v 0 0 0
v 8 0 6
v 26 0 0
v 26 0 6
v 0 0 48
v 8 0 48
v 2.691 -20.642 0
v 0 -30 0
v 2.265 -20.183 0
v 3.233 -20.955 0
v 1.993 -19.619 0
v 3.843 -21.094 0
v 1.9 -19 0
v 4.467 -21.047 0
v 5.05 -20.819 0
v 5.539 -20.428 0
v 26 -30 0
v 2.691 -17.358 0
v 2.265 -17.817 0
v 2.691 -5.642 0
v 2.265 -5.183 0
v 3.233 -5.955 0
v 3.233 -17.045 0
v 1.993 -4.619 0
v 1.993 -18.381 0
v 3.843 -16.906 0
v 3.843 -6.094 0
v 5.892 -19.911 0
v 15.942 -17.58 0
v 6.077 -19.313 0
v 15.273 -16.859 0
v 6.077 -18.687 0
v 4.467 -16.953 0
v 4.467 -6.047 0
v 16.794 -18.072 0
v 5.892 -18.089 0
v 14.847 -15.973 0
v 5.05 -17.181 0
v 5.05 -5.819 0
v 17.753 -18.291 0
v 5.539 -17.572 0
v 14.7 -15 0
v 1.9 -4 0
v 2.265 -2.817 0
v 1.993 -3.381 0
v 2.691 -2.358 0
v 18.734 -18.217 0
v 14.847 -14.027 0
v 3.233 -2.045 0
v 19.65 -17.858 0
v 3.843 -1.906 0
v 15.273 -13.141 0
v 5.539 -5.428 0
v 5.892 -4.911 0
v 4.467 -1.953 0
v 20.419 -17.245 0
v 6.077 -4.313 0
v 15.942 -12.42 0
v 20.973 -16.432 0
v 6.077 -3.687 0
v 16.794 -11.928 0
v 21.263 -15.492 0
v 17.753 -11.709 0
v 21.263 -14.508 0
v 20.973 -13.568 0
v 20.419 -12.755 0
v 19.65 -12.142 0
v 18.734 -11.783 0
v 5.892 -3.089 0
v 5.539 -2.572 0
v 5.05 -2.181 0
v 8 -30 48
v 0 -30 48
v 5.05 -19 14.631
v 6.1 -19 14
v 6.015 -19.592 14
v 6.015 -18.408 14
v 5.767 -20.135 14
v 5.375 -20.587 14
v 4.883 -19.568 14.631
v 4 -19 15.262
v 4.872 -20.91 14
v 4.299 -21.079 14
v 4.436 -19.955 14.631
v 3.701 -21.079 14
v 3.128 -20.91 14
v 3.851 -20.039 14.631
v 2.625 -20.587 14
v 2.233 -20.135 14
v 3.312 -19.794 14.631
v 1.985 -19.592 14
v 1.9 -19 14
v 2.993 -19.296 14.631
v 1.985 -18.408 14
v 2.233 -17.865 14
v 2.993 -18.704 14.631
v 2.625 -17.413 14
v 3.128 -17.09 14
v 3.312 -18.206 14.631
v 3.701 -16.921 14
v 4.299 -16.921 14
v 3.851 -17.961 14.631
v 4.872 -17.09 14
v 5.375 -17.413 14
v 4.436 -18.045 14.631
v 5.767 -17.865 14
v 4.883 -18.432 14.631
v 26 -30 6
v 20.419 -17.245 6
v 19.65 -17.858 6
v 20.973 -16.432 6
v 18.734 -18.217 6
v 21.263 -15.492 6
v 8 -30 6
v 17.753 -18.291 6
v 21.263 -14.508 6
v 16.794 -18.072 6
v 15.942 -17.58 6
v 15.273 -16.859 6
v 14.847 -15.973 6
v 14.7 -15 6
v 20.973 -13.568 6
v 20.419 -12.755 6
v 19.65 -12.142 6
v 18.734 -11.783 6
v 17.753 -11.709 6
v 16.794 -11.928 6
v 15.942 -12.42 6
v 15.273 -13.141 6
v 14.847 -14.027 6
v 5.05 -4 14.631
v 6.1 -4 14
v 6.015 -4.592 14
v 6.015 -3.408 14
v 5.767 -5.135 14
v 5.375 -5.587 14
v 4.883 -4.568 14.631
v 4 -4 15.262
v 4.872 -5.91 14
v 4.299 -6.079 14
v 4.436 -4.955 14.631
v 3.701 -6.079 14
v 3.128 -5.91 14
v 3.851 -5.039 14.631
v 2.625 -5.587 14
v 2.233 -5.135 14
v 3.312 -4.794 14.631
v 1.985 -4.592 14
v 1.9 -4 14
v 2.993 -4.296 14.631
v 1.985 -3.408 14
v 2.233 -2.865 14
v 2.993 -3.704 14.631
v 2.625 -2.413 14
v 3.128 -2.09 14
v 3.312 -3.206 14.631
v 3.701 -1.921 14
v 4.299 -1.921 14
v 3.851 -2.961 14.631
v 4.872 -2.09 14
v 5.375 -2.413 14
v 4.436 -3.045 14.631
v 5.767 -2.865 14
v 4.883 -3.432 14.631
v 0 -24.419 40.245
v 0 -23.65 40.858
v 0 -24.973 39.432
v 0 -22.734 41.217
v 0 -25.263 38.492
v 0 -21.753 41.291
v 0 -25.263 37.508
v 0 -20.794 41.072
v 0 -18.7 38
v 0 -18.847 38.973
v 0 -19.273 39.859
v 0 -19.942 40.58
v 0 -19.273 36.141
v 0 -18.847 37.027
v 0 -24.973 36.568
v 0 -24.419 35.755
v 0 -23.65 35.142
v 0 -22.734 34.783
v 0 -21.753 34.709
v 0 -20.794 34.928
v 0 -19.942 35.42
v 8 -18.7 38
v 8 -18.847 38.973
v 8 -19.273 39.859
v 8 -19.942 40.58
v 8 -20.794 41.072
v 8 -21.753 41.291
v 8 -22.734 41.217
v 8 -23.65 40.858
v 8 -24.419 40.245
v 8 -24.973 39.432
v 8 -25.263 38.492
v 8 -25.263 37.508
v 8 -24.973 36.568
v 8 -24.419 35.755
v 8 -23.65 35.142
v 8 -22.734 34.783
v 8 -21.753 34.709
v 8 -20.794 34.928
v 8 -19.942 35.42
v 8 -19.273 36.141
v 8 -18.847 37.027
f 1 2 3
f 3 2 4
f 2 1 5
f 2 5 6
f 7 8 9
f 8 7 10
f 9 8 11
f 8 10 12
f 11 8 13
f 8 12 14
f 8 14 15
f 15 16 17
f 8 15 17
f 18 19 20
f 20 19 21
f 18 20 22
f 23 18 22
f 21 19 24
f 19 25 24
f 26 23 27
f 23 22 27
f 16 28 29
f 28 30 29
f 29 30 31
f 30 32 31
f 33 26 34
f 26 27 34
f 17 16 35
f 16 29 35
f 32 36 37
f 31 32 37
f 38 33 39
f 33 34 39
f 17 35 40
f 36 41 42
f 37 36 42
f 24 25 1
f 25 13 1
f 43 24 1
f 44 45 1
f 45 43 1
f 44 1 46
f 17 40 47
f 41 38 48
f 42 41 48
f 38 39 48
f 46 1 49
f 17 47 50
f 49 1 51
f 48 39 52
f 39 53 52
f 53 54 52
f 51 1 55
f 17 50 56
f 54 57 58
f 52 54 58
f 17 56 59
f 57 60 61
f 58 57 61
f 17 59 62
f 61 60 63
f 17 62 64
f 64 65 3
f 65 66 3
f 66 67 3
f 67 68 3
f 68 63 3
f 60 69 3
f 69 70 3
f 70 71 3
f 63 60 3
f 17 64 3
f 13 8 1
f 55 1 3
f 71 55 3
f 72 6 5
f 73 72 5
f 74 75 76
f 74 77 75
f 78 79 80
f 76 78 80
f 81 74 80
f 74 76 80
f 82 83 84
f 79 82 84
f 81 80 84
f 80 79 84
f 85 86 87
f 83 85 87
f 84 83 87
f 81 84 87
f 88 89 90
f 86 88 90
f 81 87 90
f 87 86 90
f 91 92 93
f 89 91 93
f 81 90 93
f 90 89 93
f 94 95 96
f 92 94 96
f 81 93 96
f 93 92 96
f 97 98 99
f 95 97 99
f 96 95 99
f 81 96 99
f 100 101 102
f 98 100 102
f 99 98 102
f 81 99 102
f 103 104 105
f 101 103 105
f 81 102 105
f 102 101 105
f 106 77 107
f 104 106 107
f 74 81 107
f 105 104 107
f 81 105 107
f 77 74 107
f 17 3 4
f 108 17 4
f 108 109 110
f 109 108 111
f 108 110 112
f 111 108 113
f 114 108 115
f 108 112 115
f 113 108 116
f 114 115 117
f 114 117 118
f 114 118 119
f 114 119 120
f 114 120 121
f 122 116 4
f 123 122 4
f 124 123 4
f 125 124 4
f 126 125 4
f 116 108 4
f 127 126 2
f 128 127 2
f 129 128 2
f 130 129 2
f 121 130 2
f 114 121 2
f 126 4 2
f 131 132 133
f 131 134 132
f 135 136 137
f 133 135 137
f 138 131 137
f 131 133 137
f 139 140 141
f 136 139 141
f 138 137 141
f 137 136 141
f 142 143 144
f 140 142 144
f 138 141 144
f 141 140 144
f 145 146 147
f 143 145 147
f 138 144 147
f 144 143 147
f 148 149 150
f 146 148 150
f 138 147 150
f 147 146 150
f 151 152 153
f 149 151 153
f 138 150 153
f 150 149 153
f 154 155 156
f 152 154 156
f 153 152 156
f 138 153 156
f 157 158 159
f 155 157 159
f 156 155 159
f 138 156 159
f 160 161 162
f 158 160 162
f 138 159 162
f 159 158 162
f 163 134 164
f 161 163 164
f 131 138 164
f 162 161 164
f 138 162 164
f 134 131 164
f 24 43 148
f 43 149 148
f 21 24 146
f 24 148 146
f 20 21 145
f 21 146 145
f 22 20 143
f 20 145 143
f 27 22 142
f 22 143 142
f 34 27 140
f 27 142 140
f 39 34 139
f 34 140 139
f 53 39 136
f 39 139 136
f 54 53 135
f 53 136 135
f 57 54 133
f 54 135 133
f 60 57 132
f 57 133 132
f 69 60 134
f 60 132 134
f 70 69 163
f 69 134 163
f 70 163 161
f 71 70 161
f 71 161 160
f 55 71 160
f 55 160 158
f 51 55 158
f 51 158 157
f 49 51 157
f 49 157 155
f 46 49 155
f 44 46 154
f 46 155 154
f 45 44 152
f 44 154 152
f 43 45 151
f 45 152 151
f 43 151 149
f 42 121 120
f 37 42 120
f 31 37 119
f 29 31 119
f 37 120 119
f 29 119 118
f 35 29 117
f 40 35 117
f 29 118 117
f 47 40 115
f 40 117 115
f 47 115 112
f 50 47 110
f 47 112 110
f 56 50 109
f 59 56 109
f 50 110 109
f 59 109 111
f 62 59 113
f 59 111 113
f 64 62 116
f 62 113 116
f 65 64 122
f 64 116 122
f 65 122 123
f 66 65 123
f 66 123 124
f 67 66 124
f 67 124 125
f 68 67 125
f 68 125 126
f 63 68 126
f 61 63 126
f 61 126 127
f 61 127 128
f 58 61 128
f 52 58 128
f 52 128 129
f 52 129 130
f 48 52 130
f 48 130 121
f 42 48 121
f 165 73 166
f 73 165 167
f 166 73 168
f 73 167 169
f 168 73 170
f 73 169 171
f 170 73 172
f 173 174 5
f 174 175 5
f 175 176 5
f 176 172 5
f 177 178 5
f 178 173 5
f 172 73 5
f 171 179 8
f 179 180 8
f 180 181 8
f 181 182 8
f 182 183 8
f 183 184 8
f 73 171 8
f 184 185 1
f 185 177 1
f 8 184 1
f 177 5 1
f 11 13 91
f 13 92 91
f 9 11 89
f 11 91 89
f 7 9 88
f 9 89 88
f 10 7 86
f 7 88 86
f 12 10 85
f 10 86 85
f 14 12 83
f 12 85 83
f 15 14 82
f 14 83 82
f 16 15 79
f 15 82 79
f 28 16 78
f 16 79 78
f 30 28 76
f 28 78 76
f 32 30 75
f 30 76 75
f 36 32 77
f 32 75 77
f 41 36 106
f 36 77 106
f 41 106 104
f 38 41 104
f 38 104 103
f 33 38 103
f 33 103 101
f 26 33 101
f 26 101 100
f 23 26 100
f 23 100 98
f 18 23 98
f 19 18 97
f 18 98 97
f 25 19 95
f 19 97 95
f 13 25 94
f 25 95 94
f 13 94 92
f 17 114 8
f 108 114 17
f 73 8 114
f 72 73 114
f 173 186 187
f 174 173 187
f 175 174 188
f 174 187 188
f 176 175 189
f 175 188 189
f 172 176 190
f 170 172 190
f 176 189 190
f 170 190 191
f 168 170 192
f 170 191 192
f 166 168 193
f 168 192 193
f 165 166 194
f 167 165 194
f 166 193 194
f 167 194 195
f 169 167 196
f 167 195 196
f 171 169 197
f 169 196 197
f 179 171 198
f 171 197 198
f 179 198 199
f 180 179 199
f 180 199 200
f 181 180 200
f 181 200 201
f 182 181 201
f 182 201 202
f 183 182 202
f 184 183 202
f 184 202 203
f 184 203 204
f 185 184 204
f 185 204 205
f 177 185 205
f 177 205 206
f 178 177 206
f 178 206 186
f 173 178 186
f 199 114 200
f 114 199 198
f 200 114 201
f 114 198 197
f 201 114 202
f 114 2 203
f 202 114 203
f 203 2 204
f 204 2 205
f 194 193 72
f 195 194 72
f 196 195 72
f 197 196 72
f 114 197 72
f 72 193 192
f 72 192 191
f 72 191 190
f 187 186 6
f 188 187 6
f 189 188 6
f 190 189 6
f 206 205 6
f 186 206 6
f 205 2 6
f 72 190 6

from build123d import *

# Parameters (mm, degrees)
F1_DEPTH = 30
F3_D     = 6.6
F5_D     = 6.6
F6_D     = 4.2
F6_DEPTH = 14
F6_TIP   = 1.2618073


with BuildPart() as f1:
    # F0 (on Front) → F1 (new body)
    with BuildSketch(Plane.XZ):
        Polygon((8, 48), (0, 48), (0, 0), (26, 0), (26, 6), (8, 6), align=None)
    extrude(amount=F1_DEPTH)

    # F3 (through all)
    with Locations(Plane(origin=(0, 0, 0), x_dir=(0, -1, 0), z_dir=(-1, 0, 0))):
        with Locations((22, 38)):
            Hole(F3_D / 2)

    # F5 (through all)
    with Locations(Plane(origin=(0, 0, 0), x_dir=(1, 0, 0), z_dir=(0, 0, -1))):
        with Locations((18, 15)):
            Hole(F5_D / 2)

    # F6
    with Locations(Plane(origin=(0, 0, 0), x_dir=(1, 0, 0), z_dir=(0, 0, -1))):
        with Locations((4, 4), (4, 19)):
            Hole(F6_D / 2, depth=F6_DEPTH)
            with Locations((0, 0, -(F6_DEPTH + F6_TIP / 2))):  # 118° drill point
                Cone(0, F6_D / 2, F6_TIP, mode=Mode.SUBTRACT)


solid = f1.part
